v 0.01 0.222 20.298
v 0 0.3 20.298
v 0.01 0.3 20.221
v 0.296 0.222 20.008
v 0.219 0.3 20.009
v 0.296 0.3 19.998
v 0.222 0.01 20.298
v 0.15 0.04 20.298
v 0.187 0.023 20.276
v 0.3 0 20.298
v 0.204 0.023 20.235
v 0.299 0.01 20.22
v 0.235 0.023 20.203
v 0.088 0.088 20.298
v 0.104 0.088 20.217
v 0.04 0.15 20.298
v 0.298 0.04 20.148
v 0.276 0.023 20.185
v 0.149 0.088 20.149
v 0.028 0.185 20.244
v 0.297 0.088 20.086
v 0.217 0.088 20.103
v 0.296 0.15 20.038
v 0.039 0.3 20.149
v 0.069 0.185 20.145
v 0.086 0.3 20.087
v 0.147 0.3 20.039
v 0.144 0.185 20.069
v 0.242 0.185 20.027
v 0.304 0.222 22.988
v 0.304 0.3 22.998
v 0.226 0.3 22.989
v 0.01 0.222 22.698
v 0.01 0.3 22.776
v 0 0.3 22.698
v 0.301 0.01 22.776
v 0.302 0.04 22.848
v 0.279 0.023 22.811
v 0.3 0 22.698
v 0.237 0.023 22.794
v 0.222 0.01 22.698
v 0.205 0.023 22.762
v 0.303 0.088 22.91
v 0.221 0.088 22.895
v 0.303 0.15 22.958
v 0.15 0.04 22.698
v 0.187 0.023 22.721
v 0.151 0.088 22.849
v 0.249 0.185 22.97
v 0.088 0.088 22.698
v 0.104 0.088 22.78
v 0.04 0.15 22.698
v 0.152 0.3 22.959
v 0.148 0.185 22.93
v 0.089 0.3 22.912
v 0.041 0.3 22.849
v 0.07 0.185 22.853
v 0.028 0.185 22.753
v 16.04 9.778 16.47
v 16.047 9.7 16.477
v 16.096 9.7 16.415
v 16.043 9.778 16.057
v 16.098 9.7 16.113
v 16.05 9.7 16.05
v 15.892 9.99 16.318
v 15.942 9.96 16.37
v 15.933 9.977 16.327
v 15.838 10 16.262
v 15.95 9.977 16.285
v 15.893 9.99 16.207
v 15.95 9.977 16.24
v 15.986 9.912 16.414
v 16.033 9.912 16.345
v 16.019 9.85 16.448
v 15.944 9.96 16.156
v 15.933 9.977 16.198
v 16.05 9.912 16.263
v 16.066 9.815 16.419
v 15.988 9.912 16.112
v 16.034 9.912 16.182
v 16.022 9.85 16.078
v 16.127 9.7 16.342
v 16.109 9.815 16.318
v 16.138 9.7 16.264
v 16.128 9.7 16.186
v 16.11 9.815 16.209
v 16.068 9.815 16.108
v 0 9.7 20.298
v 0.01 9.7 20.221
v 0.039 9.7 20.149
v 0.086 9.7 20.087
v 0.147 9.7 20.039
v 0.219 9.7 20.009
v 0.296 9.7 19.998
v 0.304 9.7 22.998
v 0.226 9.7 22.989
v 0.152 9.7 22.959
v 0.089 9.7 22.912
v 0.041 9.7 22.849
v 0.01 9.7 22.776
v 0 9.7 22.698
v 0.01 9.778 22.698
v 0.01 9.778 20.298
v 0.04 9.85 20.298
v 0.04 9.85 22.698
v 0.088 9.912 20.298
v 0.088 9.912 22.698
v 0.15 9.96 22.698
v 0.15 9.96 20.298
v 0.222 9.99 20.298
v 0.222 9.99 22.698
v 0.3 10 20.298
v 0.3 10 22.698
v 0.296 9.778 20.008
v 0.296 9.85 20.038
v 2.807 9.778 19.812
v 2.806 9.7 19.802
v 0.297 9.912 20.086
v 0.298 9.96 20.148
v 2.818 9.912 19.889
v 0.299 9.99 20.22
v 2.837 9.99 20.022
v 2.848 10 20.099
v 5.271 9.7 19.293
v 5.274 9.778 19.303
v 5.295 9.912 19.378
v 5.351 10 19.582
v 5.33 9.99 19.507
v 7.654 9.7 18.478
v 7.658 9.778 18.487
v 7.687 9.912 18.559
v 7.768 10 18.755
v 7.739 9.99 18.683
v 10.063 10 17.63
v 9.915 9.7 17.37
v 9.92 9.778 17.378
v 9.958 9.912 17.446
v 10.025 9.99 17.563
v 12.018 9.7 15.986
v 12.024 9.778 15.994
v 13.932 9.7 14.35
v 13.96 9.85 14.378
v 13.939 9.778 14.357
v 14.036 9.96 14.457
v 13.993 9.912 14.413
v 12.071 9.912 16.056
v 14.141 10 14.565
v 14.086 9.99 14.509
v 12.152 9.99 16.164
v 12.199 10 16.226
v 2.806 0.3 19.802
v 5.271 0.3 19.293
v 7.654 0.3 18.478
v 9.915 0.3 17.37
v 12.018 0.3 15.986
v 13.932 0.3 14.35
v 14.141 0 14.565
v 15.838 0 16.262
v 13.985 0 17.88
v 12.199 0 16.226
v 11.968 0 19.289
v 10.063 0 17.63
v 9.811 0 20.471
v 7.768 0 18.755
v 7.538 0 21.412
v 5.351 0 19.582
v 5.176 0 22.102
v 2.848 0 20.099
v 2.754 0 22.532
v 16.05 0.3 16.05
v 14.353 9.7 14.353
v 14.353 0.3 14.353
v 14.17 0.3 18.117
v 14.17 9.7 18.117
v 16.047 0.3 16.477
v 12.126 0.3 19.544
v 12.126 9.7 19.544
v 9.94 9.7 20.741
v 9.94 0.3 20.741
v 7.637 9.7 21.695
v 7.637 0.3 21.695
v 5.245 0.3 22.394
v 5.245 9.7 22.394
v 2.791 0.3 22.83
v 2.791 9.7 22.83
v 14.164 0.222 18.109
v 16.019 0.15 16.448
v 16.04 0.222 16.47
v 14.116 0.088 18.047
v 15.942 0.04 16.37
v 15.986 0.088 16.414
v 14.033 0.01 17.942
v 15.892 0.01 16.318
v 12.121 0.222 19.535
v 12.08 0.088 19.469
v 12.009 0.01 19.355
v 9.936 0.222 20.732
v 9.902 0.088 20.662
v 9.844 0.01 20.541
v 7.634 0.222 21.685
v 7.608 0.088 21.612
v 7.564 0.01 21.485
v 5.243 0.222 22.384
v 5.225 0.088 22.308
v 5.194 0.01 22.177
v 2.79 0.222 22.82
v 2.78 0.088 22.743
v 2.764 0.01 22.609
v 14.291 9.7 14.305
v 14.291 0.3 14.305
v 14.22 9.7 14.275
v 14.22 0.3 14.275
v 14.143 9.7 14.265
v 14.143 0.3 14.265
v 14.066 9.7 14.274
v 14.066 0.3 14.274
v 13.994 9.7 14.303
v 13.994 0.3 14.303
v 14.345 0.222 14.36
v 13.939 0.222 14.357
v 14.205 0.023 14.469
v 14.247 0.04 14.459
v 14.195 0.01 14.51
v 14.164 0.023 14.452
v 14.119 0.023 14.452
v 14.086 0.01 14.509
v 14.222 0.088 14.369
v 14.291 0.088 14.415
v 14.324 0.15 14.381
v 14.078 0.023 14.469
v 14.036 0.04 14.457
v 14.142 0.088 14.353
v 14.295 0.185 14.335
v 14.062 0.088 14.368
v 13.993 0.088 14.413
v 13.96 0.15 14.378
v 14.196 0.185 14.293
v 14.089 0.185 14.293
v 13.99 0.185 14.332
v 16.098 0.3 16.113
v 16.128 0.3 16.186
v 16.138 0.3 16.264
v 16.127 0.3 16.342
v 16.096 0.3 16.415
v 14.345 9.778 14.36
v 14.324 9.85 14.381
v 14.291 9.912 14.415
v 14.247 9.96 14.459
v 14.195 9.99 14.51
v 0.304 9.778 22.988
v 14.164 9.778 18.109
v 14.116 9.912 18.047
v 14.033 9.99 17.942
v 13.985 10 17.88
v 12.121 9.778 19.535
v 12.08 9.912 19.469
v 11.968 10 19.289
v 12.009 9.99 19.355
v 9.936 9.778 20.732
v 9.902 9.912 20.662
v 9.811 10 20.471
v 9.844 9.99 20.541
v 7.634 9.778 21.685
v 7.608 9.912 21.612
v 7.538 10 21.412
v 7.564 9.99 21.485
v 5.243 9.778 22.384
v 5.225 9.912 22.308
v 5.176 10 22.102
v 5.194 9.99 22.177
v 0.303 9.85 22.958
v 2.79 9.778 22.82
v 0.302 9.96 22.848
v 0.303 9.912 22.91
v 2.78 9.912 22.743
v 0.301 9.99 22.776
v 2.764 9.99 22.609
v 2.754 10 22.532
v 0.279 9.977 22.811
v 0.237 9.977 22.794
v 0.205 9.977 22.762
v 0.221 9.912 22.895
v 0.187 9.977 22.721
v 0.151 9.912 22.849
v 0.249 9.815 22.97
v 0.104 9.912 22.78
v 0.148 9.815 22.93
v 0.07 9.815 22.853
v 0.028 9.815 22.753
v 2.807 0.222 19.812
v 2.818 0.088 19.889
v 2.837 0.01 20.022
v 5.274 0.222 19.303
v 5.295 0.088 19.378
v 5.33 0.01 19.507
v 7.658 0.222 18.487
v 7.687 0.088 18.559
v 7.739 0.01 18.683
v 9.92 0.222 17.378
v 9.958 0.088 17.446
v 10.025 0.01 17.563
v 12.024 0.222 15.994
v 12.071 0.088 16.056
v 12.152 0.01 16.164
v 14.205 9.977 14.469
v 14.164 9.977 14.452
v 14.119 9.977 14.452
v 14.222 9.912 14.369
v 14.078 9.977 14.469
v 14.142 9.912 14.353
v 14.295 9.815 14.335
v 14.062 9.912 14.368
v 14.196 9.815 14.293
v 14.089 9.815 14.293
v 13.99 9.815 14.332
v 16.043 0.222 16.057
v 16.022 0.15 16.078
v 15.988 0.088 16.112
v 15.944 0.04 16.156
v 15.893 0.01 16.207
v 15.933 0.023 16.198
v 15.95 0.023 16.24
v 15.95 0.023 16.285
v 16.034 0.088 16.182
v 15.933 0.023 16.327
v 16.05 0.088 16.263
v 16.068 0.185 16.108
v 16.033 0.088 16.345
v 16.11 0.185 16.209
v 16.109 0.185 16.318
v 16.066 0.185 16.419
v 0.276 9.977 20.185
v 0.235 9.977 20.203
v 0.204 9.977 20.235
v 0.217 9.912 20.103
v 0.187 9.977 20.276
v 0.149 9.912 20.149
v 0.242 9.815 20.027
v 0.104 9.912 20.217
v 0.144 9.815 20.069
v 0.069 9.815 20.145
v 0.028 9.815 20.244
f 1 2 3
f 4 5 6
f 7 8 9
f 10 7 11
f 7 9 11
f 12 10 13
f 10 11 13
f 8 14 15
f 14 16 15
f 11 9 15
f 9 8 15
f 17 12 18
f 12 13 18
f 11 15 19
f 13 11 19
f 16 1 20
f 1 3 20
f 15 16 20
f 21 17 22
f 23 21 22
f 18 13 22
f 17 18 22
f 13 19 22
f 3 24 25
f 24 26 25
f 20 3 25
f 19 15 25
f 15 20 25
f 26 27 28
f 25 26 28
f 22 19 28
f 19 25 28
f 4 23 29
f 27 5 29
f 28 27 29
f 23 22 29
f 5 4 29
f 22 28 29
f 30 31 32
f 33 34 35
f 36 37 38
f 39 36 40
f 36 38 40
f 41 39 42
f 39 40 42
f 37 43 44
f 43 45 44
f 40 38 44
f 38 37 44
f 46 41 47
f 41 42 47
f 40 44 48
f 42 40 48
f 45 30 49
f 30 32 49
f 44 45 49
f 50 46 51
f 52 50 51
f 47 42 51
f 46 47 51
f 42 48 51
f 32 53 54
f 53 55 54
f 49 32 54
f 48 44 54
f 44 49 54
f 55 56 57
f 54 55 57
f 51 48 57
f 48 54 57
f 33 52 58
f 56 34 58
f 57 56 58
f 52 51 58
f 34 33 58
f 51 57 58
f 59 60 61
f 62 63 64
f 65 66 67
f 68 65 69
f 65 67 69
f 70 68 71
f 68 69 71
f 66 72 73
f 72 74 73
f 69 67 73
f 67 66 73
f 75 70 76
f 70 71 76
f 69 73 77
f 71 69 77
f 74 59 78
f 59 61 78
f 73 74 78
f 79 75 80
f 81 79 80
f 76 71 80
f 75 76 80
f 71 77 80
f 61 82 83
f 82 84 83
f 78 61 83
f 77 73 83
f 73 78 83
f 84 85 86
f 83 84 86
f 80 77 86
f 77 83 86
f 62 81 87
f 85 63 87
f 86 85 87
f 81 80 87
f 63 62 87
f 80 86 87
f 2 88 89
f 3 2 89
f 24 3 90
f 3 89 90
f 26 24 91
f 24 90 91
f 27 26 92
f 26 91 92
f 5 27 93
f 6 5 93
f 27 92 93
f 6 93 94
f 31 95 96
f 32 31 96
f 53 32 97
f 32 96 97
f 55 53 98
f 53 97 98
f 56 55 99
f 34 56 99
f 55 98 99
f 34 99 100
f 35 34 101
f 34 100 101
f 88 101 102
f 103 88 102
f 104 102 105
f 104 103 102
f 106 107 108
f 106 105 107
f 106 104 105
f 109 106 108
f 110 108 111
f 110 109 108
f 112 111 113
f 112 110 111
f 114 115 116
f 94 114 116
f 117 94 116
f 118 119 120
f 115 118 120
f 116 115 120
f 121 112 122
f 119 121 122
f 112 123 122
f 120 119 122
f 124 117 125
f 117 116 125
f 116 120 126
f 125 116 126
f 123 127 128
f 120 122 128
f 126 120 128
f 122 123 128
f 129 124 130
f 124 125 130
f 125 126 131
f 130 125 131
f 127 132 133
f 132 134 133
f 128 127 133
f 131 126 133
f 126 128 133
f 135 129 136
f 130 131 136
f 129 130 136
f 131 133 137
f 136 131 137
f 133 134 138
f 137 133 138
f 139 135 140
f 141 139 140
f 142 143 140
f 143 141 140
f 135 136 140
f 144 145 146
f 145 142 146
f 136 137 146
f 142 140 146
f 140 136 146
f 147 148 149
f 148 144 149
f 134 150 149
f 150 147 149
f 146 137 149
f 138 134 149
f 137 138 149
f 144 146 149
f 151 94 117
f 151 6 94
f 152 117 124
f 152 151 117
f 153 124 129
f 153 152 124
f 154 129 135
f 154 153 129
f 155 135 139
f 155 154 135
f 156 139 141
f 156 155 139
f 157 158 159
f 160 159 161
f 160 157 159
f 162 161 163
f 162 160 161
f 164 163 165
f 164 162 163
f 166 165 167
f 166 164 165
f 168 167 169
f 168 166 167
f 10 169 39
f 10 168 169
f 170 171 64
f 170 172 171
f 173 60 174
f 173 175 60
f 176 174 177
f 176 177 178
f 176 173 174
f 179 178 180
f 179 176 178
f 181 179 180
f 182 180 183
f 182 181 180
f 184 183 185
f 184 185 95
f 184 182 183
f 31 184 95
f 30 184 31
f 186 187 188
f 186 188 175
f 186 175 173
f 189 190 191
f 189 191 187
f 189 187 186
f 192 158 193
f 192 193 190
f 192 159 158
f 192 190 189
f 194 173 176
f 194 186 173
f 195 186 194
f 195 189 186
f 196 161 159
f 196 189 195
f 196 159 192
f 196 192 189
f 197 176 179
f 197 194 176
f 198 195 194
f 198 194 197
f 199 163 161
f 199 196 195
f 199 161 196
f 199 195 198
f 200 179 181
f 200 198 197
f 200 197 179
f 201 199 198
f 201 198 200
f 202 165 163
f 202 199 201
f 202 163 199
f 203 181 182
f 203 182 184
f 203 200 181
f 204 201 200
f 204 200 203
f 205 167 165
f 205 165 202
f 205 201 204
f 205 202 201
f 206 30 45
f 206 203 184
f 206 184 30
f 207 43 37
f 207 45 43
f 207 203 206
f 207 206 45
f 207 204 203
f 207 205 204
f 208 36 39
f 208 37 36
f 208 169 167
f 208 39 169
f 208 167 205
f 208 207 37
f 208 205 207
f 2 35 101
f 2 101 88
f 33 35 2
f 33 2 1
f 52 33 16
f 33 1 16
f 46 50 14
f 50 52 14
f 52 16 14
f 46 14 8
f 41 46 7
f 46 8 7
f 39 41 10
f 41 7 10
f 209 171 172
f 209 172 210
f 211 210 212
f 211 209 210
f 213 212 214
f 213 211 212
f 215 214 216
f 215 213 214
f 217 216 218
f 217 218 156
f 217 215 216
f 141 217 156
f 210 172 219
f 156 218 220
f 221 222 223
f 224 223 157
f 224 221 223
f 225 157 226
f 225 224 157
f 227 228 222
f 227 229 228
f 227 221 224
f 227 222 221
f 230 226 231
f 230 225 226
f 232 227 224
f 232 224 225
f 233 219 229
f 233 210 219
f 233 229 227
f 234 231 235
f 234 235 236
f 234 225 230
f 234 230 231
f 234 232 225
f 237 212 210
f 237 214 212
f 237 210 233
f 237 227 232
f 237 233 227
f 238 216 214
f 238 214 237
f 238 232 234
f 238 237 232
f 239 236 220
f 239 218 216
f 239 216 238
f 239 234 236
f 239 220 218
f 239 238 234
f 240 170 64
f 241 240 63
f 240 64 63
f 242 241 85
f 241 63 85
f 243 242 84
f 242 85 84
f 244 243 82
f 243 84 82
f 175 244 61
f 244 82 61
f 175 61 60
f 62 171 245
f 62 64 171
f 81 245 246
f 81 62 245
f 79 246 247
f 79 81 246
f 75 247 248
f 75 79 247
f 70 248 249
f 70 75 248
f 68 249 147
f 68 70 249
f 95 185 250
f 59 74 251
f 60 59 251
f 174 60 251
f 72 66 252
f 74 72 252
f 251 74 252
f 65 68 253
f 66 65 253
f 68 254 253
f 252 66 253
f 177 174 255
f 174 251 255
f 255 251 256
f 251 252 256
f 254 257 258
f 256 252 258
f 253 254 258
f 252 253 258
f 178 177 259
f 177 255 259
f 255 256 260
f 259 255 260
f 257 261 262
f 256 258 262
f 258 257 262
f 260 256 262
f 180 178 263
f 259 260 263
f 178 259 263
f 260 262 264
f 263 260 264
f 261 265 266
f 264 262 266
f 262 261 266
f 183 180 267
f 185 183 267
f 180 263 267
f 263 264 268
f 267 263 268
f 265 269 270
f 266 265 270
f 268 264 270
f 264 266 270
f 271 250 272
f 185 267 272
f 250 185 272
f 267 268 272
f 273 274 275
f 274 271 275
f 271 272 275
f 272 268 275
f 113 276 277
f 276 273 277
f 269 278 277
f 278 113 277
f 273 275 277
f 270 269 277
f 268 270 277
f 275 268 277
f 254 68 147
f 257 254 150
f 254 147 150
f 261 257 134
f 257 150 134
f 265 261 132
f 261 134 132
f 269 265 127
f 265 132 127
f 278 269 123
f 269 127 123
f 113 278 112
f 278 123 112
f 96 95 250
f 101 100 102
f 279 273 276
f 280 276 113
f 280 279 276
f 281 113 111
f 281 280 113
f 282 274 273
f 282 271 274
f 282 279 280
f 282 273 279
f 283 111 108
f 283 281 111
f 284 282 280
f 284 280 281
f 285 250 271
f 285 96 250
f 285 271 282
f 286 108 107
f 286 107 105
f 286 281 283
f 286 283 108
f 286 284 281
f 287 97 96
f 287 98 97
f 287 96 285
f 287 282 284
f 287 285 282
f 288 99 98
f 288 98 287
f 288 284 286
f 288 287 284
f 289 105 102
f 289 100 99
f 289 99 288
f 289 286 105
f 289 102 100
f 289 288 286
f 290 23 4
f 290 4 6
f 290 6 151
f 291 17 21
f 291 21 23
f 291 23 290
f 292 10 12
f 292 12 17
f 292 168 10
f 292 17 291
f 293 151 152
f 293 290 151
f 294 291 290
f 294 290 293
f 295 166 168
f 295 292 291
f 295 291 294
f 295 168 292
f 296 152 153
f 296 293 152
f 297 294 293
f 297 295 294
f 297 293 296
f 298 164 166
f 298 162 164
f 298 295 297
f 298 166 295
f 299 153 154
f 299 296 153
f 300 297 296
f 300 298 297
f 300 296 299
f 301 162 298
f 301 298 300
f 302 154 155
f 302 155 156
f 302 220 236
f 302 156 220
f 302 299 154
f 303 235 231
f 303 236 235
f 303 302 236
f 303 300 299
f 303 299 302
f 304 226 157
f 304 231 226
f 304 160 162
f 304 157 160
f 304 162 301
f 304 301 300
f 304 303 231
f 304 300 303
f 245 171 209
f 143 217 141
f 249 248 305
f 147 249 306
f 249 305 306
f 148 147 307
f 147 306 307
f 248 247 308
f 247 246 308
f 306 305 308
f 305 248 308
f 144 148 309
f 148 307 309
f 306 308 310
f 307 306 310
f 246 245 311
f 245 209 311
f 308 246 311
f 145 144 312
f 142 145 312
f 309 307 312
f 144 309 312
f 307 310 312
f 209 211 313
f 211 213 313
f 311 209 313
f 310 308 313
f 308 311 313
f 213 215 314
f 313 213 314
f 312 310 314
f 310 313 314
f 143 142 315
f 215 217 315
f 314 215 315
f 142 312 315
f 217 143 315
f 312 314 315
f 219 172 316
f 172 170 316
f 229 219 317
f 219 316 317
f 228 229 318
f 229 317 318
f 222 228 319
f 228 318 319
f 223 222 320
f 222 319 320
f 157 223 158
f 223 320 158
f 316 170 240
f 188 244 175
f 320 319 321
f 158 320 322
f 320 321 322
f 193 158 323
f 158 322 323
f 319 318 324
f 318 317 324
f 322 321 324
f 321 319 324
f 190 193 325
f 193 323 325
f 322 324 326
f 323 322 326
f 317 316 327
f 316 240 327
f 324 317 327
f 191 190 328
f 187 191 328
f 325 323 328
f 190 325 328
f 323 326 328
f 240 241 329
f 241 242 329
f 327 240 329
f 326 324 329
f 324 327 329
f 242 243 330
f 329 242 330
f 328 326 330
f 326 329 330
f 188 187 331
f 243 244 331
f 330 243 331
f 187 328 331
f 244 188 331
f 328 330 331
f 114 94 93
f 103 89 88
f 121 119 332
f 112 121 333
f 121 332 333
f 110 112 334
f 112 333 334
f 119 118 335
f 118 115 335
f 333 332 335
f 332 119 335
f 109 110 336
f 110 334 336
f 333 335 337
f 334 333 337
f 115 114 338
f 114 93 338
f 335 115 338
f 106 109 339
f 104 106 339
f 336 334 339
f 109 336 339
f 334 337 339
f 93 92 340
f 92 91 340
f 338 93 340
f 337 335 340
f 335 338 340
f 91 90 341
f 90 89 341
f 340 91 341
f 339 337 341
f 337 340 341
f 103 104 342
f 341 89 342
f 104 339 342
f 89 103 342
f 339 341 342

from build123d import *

# Parameters (mm, degrees)
BOSS_EXTRUDE1_DEPTH = 10
FILLET1_R           = 0.3


with BuildPart() as part:
    # Sketch1 → Boss-Extrude1 (new body)
    with BuildSketch(Plane(origin=(0, 0, 0), x_dir=(1, 0, 0), z_dir=(0, 1, 0))):
        with BuildLine():
            Line((14.142135624, -14.142135624), (16.263455967, -16.263455967))
            ThreePointArc((16.263455967, -16.263455967), (8.801718944, -21.249229248), (0, -23))
            Line((0, -23), (0, -20))
            ThreePointArc((0, -20), (7.653668647, -18.47759065), (14.142135624, -14.142135624))
        make_face()
    extrude(amount=BOSS_EXTRUDE1_DEPTH)

    # Fillet1
    fillet1_edges = [part.edges().sort_by_distance(p)[0] for p in [
        (8.801718944, 10, 21.249229248),
        (15.202795796, 10, 15.202795796),
        (7.653668647, 10, 18.47759065),
        (15.202795796, 0, 15.202795796),
        (8.801718944, 0, 21.249229248),
        (0, 0, 21.5),
        (7.653668647, 0, 18.47759065),
        (0, 10, 21.5),
        (14.142135624, 5, 14.142135624),
        (16.263455967, 5, 16.263455967),
        (0, 5, 23),
        (0, 5, 20),
    ]]
    fillet(fillet1_edges, radius=FILLET1_R)


solid = part.part
